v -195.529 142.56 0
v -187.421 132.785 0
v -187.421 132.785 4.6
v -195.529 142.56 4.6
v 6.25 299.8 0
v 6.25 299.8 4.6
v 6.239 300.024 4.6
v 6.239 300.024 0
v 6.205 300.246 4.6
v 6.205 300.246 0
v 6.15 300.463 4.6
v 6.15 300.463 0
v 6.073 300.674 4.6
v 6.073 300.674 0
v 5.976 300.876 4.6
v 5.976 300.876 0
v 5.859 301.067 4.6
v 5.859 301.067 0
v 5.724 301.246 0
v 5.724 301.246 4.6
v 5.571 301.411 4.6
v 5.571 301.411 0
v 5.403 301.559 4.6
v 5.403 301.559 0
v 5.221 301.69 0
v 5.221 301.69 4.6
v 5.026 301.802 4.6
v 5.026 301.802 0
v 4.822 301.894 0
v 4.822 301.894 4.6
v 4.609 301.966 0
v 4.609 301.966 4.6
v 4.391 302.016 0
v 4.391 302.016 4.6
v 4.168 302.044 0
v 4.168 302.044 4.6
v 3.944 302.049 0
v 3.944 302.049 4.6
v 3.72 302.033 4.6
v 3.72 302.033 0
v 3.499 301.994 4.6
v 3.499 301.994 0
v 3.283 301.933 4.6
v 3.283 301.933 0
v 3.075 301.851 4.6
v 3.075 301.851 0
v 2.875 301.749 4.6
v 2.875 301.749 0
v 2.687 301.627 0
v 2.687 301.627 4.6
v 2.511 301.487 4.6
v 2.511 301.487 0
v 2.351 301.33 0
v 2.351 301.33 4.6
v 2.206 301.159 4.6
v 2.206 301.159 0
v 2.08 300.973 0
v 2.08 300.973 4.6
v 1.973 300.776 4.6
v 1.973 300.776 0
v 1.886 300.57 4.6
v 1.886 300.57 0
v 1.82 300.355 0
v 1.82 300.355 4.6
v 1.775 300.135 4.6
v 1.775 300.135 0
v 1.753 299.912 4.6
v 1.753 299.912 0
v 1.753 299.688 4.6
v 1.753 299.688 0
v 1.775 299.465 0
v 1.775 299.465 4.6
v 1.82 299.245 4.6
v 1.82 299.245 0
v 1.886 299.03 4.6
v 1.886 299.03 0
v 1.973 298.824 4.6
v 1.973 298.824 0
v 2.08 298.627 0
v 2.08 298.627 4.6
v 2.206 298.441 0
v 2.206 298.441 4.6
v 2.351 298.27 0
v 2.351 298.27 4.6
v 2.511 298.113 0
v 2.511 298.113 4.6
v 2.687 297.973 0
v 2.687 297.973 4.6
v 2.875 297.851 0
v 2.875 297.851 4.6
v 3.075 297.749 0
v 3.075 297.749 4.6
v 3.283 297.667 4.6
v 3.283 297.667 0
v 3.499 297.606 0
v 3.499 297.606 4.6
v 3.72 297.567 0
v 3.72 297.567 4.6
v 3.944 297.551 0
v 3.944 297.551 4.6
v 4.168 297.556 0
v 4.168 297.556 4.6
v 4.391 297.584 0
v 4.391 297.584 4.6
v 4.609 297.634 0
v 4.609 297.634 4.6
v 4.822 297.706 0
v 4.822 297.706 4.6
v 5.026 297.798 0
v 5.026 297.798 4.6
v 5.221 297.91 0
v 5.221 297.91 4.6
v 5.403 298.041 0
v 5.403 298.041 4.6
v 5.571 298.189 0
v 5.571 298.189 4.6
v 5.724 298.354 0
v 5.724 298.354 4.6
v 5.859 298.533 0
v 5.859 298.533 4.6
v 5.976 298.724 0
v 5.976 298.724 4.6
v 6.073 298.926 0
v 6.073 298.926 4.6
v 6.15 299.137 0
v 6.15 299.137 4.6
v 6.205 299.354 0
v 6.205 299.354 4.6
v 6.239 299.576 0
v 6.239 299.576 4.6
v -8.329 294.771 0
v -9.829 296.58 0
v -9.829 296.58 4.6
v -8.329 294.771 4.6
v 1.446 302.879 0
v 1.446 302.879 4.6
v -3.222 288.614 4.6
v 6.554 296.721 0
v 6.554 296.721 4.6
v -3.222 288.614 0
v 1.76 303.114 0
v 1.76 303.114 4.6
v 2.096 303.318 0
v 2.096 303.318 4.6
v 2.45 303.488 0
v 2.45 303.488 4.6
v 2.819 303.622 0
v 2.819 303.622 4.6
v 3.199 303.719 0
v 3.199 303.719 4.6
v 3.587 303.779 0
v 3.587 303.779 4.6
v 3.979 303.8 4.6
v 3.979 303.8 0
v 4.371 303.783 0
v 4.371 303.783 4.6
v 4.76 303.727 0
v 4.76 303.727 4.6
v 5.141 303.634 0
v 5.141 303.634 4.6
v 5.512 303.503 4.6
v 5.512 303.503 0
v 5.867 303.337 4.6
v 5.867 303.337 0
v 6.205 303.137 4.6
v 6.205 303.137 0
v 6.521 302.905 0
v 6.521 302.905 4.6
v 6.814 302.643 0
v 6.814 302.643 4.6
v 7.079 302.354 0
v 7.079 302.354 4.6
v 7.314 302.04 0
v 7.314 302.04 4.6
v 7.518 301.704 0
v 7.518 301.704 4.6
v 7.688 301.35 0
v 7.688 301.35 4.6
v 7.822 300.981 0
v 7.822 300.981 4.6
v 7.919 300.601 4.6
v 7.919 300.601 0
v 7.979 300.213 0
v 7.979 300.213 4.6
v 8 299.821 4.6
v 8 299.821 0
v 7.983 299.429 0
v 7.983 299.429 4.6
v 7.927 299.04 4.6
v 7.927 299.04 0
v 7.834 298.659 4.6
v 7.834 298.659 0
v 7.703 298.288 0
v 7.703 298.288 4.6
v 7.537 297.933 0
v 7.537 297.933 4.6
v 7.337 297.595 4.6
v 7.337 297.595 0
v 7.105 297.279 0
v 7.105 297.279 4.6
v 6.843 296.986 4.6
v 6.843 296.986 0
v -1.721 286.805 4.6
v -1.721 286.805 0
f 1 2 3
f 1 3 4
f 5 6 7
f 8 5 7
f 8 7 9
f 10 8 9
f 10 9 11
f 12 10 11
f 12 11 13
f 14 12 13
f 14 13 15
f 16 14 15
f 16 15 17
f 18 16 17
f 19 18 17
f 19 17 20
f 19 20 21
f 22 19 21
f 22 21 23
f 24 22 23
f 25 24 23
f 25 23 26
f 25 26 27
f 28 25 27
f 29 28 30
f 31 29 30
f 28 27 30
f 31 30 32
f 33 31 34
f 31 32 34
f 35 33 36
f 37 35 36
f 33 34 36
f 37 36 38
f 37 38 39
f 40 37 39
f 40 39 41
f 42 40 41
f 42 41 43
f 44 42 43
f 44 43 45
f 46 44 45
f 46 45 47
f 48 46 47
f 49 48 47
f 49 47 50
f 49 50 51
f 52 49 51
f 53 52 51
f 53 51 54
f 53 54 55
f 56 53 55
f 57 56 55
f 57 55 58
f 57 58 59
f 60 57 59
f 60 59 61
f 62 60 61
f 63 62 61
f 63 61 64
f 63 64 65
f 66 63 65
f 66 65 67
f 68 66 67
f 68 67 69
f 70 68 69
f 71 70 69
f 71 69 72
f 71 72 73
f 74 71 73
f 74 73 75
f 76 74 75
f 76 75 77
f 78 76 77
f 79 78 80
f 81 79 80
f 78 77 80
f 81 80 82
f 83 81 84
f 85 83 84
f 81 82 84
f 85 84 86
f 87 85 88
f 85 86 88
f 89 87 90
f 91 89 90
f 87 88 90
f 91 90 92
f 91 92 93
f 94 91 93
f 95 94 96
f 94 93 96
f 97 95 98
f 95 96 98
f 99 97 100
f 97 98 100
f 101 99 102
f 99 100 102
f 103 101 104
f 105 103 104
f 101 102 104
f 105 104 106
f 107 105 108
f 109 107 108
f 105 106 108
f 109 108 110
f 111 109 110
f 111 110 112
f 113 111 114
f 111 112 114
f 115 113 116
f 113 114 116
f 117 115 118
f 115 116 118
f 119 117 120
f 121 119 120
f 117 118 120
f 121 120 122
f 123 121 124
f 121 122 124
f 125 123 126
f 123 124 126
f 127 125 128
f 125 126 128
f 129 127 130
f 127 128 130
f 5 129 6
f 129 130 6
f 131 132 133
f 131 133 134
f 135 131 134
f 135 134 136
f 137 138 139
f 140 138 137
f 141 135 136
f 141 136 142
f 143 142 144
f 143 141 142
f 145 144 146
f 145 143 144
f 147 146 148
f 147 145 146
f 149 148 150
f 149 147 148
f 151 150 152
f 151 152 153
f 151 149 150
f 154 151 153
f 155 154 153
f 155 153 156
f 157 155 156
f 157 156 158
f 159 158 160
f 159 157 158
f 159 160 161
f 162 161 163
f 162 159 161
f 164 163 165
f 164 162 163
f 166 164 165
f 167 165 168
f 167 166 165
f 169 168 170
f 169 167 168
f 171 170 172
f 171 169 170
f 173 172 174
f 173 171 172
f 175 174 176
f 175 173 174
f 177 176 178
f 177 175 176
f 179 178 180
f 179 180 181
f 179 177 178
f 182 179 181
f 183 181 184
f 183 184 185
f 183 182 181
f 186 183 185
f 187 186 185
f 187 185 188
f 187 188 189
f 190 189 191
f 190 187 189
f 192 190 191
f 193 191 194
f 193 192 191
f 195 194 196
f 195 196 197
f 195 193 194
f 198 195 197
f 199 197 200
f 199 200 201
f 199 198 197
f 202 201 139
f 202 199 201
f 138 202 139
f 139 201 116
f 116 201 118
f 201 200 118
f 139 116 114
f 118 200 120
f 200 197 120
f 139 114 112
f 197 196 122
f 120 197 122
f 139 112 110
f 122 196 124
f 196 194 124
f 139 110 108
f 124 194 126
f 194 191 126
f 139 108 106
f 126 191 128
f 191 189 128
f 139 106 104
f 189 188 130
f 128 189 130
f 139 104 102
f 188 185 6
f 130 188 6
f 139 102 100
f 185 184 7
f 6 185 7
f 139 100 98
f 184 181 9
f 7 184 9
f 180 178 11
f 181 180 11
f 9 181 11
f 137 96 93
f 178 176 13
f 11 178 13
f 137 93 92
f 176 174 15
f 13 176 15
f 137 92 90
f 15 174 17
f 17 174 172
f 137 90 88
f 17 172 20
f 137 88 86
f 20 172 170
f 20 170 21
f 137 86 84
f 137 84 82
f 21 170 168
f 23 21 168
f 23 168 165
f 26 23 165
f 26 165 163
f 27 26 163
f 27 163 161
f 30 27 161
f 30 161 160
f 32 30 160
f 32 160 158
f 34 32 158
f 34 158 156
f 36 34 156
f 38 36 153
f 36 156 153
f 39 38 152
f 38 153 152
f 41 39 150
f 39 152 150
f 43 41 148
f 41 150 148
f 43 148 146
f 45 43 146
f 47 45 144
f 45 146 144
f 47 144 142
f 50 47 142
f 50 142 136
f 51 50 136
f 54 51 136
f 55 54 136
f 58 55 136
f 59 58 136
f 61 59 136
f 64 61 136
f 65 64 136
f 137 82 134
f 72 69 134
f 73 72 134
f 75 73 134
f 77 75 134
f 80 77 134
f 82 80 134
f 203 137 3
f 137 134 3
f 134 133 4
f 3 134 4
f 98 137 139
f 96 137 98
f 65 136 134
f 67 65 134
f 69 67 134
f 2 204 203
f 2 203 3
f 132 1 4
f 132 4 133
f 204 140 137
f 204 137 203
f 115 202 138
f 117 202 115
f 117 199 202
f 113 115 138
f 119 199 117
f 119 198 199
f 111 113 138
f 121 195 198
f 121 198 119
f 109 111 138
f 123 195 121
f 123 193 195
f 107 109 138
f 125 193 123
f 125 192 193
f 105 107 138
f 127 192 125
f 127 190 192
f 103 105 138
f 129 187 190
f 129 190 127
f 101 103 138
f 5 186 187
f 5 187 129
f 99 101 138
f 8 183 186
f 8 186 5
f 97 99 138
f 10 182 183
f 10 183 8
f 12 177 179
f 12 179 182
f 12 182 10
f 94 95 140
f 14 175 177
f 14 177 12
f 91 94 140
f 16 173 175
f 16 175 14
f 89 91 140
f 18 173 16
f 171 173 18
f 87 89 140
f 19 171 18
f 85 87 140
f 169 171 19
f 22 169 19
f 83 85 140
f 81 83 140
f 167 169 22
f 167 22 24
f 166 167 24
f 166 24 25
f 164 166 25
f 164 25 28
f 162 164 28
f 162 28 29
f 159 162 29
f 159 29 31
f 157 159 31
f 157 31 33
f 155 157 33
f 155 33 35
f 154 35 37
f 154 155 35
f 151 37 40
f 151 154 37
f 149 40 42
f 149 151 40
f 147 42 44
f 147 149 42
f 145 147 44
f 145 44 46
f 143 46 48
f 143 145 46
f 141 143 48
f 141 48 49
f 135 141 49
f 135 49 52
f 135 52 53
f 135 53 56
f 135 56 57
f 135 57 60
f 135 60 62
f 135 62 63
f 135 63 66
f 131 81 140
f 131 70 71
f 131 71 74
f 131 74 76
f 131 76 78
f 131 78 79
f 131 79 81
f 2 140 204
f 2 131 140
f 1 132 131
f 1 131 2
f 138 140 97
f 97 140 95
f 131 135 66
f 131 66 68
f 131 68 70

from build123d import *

# Parameters (mm, degrees)
BOSS_EXTRUDE1_DEPTH = 4.6
SKETCH2_R           = 2.25
CUT_EXTRUDE1_DEPTH  = 362.31293858


with BuildPart() as part:
    # Sketch1 → Boss-Extrude1 (new body)
    with BuildSketch(Plane.XY):
        with BuildLine():
            Line((6.553588095, 296.721171027), (-3.221693894, 288.613528827))
            Line((-3.221693894, 288.613528827), (-1.721460888, 286.804716805))
            Line((-1.721460888, 286.804716805), (-187.42097357, 132.785097993))
            Line((-187.42097357, 132.785097993), (-195.528615771, 142.560379981))
            Line((-195.528615771, 142.560379981), (-9.829103088, 296.579998794))
            Line((-9.829103088, 296.579998794), (-8.328870083, 294.771186772))
            Line((-8.328870083, 294.771186772), (1.446411905, 302.878828973))
            ThreePointArc((1.446411905, 302.878828973), (7.078828973, 302.353588095), (6.553588095, 296.721171027))
        make_face()
    extrude(amount=BOSS_EXTRUDE1_DEPTH)

    # Sketch2 → Cut-Extrude1 (cut, through all)
    with BuildSketch(Plane.XY.offset(4.6)):
        with Locations((4, 299.8)):
            Circle(SKETCH2_R)
    extrude(amount=-CUT_EXTRUDE1_DEPTH, mode=Mode.SUBTRACT)


solid = part.part
